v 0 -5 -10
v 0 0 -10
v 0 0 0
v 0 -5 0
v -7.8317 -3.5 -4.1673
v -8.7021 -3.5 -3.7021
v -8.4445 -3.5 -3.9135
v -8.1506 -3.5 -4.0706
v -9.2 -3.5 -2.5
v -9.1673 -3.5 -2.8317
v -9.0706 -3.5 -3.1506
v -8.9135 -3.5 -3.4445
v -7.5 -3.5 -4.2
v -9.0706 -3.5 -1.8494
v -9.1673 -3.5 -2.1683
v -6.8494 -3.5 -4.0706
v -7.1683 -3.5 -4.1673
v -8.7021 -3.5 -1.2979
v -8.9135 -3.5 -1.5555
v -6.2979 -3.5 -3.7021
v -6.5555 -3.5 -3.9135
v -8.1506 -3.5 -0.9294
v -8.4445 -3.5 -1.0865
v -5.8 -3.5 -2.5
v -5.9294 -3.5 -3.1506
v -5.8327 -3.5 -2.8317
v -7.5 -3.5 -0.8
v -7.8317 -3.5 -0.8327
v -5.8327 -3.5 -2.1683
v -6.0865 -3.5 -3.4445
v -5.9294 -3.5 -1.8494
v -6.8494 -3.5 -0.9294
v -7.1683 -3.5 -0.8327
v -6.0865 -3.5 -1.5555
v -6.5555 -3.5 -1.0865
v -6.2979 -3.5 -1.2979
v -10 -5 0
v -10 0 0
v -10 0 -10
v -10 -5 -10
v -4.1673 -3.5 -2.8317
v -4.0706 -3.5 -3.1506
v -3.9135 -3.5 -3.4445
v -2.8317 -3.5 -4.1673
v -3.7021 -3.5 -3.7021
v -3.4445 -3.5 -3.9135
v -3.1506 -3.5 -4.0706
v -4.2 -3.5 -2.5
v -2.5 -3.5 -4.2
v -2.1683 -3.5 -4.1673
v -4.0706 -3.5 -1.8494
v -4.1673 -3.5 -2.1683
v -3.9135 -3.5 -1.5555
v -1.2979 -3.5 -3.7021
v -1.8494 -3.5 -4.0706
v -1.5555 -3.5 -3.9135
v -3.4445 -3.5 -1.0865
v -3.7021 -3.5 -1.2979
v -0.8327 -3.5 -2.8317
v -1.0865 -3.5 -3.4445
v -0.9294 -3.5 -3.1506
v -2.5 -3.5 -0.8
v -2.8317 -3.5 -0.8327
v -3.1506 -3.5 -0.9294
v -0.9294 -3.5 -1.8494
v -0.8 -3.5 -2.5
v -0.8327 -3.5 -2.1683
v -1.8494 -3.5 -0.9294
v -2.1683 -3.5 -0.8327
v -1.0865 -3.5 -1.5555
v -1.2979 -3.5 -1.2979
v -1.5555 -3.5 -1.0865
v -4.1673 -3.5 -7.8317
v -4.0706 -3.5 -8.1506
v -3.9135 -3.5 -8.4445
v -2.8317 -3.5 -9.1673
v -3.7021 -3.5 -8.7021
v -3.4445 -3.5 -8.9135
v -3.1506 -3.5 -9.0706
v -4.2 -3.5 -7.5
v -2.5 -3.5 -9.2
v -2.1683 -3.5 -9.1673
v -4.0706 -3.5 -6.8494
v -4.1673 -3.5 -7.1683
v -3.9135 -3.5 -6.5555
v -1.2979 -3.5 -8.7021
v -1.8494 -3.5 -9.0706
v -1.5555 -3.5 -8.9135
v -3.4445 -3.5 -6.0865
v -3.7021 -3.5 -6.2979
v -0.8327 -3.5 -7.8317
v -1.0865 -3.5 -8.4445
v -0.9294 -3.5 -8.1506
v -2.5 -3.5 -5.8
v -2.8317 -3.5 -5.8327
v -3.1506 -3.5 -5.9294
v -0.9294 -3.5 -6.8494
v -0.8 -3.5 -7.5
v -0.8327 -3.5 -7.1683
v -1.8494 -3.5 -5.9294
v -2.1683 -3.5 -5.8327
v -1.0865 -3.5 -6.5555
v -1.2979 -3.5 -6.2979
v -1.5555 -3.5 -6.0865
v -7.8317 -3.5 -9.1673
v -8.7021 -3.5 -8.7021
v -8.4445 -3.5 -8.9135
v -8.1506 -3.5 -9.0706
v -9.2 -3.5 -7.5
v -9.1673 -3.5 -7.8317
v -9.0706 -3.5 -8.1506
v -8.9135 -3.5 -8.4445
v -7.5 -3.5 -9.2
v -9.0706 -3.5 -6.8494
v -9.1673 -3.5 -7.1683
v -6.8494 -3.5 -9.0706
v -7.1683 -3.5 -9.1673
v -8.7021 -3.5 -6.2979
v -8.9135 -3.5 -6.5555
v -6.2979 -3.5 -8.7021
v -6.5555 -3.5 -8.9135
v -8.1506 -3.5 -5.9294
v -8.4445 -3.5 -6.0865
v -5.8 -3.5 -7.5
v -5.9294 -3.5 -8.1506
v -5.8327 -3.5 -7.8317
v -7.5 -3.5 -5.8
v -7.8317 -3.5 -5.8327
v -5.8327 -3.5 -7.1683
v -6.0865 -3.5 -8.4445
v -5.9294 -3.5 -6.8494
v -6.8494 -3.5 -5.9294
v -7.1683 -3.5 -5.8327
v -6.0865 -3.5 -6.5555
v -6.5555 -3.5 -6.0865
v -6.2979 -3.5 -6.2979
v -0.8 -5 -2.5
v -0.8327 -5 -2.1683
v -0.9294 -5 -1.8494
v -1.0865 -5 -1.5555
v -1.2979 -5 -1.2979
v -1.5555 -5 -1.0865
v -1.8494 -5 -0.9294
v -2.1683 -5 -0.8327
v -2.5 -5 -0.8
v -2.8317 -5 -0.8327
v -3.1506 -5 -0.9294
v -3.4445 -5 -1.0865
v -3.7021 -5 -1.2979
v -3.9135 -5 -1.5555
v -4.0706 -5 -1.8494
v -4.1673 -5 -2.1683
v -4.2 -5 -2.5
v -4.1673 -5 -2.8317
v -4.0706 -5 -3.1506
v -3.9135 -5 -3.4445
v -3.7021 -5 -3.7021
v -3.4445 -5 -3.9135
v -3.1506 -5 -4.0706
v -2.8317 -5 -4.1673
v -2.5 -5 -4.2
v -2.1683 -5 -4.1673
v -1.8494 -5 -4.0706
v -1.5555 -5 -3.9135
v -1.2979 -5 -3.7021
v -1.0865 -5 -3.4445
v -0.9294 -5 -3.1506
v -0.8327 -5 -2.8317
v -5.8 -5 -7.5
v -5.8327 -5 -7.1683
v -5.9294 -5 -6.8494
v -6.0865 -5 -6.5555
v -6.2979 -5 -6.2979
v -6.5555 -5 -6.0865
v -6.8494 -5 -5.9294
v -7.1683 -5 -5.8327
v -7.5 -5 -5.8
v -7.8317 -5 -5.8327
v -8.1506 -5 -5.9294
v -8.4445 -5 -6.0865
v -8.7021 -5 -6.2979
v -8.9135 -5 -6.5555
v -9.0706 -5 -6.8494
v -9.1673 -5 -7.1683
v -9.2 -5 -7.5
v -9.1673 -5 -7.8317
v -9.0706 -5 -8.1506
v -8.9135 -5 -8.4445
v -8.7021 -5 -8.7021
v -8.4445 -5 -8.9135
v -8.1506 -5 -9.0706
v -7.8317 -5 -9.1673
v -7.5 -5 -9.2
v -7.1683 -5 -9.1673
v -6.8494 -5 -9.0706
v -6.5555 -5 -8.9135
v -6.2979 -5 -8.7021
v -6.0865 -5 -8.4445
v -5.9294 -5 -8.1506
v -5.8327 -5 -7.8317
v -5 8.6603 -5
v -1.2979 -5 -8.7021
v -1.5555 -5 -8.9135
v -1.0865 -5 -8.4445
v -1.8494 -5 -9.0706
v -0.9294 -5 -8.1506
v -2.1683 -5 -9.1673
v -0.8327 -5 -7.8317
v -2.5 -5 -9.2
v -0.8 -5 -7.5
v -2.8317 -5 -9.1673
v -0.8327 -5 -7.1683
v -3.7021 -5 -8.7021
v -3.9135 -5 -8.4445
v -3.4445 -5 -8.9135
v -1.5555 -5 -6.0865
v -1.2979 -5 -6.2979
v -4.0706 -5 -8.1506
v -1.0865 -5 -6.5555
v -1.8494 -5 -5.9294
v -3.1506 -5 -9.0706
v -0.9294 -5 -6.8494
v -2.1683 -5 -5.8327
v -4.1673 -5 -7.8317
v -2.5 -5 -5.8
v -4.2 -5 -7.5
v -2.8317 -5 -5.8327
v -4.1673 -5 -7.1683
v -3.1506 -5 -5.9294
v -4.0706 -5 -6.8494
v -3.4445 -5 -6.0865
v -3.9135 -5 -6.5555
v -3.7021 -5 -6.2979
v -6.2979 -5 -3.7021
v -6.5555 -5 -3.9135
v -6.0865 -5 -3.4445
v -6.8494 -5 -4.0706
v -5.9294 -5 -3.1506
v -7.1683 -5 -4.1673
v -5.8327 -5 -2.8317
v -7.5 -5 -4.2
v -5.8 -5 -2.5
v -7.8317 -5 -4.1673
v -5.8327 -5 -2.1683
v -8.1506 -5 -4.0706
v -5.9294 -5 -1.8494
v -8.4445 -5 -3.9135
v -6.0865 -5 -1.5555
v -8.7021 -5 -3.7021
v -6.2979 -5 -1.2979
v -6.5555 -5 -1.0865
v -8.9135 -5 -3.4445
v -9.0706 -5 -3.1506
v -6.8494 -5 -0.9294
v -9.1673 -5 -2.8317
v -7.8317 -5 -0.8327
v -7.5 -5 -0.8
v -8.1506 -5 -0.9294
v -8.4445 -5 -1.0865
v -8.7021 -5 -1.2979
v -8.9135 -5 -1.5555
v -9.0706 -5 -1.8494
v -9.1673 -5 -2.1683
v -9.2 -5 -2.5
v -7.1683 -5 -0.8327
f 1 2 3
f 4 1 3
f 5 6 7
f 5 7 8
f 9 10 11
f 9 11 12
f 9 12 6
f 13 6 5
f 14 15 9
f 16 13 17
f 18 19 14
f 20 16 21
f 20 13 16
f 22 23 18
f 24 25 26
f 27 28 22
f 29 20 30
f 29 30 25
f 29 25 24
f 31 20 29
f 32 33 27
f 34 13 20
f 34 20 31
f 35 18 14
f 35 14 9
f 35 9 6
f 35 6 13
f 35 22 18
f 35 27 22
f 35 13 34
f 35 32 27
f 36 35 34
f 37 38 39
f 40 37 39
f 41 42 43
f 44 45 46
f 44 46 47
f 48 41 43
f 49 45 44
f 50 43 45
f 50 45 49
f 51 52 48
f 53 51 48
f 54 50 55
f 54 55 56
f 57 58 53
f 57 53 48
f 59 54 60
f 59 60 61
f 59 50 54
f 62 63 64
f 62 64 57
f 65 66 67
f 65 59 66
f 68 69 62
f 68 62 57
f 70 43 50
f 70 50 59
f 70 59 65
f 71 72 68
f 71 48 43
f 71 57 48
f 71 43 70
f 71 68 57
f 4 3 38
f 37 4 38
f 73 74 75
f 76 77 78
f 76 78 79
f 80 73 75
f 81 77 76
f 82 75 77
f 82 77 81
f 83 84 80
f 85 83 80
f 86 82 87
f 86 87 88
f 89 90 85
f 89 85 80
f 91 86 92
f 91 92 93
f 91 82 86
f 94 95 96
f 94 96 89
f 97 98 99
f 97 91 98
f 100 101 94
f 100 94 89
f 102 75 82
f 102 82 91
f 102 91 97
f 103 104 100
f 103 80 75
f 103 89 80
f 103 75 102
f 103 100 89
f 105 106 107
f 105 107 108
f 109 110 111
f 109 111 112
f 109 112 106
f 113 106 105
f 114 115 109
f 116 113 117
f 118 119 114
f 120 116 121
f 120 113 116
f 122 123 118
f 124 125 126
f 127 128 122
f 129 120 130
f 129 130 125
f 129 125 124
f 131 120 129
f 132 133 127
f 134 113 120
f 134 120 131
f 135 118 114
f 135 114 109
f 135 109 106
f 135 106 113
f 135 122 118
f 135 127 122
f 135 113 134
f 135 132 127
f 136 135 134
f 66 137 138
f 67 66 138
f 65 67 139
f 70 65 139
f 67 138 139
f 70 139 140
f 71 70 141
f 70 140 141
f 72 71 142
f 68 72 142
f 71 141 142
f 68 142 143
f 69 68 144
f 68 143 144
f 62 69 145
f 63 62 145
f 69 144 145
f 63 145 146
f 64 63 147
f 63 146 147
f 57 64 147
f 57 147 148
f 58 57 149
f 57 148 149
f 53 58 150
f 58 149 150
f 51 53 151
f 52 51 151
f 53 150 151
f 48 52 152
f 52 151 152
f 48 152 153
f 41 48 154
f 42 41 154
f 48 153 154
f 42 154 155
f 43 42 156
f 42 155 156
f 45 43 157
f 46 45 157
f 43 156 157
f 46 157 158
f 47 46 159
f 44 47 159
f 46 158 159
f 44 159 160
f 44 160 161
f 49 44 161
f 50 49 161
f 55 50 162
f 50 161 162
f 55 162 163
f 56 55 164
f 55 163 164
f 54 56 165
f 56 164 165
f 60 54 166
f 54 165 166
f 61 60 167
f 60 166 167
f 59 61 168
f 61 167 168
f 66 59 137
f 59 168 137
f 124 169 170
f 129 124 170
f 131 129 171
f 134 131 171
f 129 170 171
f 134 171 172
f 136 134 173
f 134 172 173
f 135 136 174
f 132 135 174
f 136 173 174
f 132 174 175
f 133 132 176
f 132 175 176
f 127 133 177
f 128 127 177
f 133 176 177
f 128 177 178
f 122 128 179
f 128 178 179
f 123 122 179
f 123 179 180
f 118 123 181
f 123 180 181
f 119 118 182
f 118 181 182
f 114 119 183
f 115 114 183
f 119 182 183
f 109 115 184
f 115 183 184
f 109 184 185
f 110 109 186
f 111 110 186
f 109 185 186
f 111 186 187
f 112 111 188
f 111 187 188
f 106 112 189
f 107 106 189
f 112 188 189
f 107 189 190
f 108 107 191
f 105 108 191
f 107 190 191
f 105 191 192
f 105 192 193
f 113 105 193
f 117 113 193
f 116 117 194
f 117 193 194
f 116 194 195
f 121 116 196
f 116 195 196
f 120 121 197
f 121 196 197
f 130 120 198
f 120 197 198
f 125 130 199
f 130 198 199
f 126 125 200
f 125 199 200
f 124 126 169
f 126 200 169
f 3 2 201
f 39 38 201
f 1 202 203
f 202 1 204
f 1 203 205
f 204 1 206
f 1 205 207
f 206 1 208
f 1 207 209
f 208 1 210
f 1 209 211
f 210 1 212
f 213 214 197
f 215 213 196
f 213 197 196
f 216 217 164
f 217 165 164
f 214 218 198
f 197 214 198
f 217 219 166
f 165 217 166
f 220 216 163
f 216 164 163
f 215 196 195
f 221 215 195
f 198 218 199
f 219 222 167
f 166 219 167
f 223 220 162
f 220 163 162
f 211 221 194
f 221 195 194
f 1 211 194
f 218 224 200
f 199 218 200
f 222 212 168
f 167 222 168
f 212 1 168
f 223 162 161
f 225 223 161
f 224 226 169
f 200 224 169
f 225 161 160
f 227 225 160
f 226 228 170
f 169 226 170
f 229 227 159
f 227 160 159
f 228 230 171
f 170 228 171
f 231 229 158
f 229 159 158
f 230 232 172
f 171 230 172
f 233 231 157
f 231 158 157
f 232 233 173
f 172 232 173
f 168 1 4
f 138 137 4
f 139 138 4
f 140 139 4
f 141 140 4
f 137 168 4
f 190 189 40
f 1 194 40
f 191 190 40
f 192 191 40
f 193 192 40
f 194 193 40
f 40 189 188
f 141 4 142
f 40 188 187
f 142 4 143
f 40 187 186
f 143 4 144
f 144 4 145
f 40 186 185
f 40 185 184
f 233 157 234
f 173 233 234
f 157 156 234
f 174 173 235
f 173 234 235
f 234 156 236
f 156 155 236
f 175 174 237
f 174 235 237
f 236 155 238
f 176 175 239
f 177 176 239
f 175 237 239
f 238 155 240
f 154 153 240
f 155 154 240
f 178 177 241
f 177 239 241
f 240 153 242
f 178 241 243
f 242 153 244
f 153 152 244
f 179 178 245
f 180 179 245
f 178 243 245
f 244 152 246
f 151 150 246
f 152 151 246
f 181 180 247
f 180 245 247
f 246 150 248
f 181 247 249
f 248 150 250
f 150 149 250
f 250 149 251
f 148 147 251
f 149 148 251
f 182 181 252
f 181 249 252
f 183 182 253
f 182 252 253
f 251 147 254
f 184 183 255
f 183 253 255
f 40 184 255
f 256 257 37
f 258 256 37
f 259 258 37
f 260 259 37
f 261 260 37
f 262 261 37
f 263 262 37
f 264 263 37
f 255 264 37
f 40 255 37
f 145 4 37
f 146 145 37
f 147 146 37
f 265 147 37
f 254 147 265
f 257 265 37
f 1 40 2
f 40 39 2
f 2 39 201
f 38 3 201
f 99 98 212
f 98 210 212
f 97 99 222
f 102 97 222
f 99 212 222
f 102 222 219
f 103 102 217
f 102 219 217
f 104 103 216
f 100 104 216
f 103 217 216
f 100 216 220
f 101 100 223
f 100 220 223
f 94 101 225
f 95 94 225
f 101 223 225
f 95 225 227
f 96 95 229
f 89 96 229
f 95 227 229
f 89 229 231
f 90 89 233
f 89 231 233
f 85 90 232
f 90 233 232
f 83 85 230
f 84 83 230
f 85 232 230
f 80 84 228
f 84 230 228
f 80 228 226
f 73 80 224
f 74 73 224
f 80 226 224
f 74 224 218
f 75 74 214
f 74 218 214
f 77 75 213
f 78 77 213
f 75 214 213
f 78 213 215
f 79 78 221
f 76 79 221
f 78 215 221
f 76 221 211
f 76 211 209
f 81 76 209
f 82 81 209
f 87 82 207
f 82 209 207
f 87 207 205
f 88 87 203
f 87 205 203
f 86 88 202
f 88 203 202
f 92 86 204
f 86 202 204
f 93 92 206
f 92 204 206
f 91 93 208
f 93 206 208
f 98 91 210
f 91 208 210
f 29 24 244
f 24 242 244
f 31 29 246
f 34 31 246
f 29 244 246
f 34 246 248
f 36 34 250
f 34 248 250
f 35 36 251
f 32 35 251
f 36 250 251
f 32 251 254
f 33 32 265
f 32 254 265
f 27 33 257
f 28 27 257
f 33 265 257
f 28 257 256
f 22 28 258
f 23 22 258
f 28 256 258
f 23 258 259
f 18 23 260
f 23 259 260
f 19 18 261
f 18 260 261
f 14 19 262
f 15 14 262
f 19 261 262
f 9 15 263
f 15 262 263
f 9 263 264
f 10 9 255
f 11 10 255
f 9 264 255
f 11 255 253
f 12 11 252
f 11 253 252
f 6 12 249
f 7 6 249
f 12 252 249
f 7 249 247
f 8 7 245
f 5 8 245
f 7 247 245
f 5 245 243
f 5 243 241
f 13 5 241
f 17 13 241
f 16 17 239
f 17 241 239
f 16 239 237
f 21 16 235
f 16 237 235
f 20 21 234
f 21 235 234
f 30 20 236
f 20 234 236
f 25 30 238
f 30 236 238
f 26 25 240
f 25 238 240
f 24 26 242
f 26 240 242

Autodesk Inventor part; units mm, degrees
ref_plane "YZ Plane" through (0, 0, 0) normal (1, 0, 0) x (0, 1, 0)
ref_plane "XZ Plane" through (0, 0, 0) normal (0, 1, 0) x (-1, 0, 0)
ref_plane "XY Plane" through (0, 0, 0) normal (0, 0, 1) x (1, 0, 0)
sketch "草圖1" plane through (0, 0, 0) normal (0, 1, 0) x (-1, 0, 0)
  line L0 (0, 0) -> (10, 0)
  line L1 (10, 0) -> (10, -10)
  line L2 (10, -10) -> (0, -10)
  line L3 (0, -10) -> (0, 0)
  circle A0 centre (7.5, -2.5) radius 1.7
  circle A1 centre (7.5, -7.5) radius 1.7
  circle A2 centre (2.5, -2.5) radius 1.7
  circle A3 centre (2.5, -7.5) radius 1.7
  dimension "d0" = 10
  dimension "d1" = 10
  dimension "d2" = 3.4
  dimension "d3" = 2.5
  dimension "d4" = 2.5
  dimension "d7" = 5
  dimension "d10" = 5
extrude "擠出1" add sketch "草圖1" against normal blind 5 contours L0 L1 L2 L3 | A0 | A1 | A2 | A3
sketch "草圖1 outline for 擠出2" plane through (0, 0, 0) normal (0, 1, 0) x (-1, 0, 0)
  line L0 (0, 0) -> (0, -10)
  line L1 (10, 0) -> (0, 0)
  line L2 (10, -10) -> (10, 0)
  line L3 (0, -10) -> (10, -10)
extrude "擠出2" add sketch "草圖1 outline for 擠出2" along normal blind 10 draft -30
sketch "草圖2" plane through (0, -5, 0) normal (0, -1, 0) x (1, 0, 0)
  circle A0 centre (-7.5, -7.5) radius 1.7 projected
  line L0 (-10, -10) -> (0, -10) projected
  line L1 (0, -10) -> (0, 0) projected
  line L2 (0, 0) -> (-10, 0) projected
  line L3 (-10, 0) -> (-10, -10) projected
extrude "擠出3" cut sketch "草圖2" against normal blind 1.5 contours A0
pattern_linear "矩形陣列1" count 2 spacing 5 along (0, 0, 1) count 2 spacing 5 along (1, 0, 0) of "擠出3"
properties part number "110033226_ipt_35_中心城堡圍牆頂部_MIR"
